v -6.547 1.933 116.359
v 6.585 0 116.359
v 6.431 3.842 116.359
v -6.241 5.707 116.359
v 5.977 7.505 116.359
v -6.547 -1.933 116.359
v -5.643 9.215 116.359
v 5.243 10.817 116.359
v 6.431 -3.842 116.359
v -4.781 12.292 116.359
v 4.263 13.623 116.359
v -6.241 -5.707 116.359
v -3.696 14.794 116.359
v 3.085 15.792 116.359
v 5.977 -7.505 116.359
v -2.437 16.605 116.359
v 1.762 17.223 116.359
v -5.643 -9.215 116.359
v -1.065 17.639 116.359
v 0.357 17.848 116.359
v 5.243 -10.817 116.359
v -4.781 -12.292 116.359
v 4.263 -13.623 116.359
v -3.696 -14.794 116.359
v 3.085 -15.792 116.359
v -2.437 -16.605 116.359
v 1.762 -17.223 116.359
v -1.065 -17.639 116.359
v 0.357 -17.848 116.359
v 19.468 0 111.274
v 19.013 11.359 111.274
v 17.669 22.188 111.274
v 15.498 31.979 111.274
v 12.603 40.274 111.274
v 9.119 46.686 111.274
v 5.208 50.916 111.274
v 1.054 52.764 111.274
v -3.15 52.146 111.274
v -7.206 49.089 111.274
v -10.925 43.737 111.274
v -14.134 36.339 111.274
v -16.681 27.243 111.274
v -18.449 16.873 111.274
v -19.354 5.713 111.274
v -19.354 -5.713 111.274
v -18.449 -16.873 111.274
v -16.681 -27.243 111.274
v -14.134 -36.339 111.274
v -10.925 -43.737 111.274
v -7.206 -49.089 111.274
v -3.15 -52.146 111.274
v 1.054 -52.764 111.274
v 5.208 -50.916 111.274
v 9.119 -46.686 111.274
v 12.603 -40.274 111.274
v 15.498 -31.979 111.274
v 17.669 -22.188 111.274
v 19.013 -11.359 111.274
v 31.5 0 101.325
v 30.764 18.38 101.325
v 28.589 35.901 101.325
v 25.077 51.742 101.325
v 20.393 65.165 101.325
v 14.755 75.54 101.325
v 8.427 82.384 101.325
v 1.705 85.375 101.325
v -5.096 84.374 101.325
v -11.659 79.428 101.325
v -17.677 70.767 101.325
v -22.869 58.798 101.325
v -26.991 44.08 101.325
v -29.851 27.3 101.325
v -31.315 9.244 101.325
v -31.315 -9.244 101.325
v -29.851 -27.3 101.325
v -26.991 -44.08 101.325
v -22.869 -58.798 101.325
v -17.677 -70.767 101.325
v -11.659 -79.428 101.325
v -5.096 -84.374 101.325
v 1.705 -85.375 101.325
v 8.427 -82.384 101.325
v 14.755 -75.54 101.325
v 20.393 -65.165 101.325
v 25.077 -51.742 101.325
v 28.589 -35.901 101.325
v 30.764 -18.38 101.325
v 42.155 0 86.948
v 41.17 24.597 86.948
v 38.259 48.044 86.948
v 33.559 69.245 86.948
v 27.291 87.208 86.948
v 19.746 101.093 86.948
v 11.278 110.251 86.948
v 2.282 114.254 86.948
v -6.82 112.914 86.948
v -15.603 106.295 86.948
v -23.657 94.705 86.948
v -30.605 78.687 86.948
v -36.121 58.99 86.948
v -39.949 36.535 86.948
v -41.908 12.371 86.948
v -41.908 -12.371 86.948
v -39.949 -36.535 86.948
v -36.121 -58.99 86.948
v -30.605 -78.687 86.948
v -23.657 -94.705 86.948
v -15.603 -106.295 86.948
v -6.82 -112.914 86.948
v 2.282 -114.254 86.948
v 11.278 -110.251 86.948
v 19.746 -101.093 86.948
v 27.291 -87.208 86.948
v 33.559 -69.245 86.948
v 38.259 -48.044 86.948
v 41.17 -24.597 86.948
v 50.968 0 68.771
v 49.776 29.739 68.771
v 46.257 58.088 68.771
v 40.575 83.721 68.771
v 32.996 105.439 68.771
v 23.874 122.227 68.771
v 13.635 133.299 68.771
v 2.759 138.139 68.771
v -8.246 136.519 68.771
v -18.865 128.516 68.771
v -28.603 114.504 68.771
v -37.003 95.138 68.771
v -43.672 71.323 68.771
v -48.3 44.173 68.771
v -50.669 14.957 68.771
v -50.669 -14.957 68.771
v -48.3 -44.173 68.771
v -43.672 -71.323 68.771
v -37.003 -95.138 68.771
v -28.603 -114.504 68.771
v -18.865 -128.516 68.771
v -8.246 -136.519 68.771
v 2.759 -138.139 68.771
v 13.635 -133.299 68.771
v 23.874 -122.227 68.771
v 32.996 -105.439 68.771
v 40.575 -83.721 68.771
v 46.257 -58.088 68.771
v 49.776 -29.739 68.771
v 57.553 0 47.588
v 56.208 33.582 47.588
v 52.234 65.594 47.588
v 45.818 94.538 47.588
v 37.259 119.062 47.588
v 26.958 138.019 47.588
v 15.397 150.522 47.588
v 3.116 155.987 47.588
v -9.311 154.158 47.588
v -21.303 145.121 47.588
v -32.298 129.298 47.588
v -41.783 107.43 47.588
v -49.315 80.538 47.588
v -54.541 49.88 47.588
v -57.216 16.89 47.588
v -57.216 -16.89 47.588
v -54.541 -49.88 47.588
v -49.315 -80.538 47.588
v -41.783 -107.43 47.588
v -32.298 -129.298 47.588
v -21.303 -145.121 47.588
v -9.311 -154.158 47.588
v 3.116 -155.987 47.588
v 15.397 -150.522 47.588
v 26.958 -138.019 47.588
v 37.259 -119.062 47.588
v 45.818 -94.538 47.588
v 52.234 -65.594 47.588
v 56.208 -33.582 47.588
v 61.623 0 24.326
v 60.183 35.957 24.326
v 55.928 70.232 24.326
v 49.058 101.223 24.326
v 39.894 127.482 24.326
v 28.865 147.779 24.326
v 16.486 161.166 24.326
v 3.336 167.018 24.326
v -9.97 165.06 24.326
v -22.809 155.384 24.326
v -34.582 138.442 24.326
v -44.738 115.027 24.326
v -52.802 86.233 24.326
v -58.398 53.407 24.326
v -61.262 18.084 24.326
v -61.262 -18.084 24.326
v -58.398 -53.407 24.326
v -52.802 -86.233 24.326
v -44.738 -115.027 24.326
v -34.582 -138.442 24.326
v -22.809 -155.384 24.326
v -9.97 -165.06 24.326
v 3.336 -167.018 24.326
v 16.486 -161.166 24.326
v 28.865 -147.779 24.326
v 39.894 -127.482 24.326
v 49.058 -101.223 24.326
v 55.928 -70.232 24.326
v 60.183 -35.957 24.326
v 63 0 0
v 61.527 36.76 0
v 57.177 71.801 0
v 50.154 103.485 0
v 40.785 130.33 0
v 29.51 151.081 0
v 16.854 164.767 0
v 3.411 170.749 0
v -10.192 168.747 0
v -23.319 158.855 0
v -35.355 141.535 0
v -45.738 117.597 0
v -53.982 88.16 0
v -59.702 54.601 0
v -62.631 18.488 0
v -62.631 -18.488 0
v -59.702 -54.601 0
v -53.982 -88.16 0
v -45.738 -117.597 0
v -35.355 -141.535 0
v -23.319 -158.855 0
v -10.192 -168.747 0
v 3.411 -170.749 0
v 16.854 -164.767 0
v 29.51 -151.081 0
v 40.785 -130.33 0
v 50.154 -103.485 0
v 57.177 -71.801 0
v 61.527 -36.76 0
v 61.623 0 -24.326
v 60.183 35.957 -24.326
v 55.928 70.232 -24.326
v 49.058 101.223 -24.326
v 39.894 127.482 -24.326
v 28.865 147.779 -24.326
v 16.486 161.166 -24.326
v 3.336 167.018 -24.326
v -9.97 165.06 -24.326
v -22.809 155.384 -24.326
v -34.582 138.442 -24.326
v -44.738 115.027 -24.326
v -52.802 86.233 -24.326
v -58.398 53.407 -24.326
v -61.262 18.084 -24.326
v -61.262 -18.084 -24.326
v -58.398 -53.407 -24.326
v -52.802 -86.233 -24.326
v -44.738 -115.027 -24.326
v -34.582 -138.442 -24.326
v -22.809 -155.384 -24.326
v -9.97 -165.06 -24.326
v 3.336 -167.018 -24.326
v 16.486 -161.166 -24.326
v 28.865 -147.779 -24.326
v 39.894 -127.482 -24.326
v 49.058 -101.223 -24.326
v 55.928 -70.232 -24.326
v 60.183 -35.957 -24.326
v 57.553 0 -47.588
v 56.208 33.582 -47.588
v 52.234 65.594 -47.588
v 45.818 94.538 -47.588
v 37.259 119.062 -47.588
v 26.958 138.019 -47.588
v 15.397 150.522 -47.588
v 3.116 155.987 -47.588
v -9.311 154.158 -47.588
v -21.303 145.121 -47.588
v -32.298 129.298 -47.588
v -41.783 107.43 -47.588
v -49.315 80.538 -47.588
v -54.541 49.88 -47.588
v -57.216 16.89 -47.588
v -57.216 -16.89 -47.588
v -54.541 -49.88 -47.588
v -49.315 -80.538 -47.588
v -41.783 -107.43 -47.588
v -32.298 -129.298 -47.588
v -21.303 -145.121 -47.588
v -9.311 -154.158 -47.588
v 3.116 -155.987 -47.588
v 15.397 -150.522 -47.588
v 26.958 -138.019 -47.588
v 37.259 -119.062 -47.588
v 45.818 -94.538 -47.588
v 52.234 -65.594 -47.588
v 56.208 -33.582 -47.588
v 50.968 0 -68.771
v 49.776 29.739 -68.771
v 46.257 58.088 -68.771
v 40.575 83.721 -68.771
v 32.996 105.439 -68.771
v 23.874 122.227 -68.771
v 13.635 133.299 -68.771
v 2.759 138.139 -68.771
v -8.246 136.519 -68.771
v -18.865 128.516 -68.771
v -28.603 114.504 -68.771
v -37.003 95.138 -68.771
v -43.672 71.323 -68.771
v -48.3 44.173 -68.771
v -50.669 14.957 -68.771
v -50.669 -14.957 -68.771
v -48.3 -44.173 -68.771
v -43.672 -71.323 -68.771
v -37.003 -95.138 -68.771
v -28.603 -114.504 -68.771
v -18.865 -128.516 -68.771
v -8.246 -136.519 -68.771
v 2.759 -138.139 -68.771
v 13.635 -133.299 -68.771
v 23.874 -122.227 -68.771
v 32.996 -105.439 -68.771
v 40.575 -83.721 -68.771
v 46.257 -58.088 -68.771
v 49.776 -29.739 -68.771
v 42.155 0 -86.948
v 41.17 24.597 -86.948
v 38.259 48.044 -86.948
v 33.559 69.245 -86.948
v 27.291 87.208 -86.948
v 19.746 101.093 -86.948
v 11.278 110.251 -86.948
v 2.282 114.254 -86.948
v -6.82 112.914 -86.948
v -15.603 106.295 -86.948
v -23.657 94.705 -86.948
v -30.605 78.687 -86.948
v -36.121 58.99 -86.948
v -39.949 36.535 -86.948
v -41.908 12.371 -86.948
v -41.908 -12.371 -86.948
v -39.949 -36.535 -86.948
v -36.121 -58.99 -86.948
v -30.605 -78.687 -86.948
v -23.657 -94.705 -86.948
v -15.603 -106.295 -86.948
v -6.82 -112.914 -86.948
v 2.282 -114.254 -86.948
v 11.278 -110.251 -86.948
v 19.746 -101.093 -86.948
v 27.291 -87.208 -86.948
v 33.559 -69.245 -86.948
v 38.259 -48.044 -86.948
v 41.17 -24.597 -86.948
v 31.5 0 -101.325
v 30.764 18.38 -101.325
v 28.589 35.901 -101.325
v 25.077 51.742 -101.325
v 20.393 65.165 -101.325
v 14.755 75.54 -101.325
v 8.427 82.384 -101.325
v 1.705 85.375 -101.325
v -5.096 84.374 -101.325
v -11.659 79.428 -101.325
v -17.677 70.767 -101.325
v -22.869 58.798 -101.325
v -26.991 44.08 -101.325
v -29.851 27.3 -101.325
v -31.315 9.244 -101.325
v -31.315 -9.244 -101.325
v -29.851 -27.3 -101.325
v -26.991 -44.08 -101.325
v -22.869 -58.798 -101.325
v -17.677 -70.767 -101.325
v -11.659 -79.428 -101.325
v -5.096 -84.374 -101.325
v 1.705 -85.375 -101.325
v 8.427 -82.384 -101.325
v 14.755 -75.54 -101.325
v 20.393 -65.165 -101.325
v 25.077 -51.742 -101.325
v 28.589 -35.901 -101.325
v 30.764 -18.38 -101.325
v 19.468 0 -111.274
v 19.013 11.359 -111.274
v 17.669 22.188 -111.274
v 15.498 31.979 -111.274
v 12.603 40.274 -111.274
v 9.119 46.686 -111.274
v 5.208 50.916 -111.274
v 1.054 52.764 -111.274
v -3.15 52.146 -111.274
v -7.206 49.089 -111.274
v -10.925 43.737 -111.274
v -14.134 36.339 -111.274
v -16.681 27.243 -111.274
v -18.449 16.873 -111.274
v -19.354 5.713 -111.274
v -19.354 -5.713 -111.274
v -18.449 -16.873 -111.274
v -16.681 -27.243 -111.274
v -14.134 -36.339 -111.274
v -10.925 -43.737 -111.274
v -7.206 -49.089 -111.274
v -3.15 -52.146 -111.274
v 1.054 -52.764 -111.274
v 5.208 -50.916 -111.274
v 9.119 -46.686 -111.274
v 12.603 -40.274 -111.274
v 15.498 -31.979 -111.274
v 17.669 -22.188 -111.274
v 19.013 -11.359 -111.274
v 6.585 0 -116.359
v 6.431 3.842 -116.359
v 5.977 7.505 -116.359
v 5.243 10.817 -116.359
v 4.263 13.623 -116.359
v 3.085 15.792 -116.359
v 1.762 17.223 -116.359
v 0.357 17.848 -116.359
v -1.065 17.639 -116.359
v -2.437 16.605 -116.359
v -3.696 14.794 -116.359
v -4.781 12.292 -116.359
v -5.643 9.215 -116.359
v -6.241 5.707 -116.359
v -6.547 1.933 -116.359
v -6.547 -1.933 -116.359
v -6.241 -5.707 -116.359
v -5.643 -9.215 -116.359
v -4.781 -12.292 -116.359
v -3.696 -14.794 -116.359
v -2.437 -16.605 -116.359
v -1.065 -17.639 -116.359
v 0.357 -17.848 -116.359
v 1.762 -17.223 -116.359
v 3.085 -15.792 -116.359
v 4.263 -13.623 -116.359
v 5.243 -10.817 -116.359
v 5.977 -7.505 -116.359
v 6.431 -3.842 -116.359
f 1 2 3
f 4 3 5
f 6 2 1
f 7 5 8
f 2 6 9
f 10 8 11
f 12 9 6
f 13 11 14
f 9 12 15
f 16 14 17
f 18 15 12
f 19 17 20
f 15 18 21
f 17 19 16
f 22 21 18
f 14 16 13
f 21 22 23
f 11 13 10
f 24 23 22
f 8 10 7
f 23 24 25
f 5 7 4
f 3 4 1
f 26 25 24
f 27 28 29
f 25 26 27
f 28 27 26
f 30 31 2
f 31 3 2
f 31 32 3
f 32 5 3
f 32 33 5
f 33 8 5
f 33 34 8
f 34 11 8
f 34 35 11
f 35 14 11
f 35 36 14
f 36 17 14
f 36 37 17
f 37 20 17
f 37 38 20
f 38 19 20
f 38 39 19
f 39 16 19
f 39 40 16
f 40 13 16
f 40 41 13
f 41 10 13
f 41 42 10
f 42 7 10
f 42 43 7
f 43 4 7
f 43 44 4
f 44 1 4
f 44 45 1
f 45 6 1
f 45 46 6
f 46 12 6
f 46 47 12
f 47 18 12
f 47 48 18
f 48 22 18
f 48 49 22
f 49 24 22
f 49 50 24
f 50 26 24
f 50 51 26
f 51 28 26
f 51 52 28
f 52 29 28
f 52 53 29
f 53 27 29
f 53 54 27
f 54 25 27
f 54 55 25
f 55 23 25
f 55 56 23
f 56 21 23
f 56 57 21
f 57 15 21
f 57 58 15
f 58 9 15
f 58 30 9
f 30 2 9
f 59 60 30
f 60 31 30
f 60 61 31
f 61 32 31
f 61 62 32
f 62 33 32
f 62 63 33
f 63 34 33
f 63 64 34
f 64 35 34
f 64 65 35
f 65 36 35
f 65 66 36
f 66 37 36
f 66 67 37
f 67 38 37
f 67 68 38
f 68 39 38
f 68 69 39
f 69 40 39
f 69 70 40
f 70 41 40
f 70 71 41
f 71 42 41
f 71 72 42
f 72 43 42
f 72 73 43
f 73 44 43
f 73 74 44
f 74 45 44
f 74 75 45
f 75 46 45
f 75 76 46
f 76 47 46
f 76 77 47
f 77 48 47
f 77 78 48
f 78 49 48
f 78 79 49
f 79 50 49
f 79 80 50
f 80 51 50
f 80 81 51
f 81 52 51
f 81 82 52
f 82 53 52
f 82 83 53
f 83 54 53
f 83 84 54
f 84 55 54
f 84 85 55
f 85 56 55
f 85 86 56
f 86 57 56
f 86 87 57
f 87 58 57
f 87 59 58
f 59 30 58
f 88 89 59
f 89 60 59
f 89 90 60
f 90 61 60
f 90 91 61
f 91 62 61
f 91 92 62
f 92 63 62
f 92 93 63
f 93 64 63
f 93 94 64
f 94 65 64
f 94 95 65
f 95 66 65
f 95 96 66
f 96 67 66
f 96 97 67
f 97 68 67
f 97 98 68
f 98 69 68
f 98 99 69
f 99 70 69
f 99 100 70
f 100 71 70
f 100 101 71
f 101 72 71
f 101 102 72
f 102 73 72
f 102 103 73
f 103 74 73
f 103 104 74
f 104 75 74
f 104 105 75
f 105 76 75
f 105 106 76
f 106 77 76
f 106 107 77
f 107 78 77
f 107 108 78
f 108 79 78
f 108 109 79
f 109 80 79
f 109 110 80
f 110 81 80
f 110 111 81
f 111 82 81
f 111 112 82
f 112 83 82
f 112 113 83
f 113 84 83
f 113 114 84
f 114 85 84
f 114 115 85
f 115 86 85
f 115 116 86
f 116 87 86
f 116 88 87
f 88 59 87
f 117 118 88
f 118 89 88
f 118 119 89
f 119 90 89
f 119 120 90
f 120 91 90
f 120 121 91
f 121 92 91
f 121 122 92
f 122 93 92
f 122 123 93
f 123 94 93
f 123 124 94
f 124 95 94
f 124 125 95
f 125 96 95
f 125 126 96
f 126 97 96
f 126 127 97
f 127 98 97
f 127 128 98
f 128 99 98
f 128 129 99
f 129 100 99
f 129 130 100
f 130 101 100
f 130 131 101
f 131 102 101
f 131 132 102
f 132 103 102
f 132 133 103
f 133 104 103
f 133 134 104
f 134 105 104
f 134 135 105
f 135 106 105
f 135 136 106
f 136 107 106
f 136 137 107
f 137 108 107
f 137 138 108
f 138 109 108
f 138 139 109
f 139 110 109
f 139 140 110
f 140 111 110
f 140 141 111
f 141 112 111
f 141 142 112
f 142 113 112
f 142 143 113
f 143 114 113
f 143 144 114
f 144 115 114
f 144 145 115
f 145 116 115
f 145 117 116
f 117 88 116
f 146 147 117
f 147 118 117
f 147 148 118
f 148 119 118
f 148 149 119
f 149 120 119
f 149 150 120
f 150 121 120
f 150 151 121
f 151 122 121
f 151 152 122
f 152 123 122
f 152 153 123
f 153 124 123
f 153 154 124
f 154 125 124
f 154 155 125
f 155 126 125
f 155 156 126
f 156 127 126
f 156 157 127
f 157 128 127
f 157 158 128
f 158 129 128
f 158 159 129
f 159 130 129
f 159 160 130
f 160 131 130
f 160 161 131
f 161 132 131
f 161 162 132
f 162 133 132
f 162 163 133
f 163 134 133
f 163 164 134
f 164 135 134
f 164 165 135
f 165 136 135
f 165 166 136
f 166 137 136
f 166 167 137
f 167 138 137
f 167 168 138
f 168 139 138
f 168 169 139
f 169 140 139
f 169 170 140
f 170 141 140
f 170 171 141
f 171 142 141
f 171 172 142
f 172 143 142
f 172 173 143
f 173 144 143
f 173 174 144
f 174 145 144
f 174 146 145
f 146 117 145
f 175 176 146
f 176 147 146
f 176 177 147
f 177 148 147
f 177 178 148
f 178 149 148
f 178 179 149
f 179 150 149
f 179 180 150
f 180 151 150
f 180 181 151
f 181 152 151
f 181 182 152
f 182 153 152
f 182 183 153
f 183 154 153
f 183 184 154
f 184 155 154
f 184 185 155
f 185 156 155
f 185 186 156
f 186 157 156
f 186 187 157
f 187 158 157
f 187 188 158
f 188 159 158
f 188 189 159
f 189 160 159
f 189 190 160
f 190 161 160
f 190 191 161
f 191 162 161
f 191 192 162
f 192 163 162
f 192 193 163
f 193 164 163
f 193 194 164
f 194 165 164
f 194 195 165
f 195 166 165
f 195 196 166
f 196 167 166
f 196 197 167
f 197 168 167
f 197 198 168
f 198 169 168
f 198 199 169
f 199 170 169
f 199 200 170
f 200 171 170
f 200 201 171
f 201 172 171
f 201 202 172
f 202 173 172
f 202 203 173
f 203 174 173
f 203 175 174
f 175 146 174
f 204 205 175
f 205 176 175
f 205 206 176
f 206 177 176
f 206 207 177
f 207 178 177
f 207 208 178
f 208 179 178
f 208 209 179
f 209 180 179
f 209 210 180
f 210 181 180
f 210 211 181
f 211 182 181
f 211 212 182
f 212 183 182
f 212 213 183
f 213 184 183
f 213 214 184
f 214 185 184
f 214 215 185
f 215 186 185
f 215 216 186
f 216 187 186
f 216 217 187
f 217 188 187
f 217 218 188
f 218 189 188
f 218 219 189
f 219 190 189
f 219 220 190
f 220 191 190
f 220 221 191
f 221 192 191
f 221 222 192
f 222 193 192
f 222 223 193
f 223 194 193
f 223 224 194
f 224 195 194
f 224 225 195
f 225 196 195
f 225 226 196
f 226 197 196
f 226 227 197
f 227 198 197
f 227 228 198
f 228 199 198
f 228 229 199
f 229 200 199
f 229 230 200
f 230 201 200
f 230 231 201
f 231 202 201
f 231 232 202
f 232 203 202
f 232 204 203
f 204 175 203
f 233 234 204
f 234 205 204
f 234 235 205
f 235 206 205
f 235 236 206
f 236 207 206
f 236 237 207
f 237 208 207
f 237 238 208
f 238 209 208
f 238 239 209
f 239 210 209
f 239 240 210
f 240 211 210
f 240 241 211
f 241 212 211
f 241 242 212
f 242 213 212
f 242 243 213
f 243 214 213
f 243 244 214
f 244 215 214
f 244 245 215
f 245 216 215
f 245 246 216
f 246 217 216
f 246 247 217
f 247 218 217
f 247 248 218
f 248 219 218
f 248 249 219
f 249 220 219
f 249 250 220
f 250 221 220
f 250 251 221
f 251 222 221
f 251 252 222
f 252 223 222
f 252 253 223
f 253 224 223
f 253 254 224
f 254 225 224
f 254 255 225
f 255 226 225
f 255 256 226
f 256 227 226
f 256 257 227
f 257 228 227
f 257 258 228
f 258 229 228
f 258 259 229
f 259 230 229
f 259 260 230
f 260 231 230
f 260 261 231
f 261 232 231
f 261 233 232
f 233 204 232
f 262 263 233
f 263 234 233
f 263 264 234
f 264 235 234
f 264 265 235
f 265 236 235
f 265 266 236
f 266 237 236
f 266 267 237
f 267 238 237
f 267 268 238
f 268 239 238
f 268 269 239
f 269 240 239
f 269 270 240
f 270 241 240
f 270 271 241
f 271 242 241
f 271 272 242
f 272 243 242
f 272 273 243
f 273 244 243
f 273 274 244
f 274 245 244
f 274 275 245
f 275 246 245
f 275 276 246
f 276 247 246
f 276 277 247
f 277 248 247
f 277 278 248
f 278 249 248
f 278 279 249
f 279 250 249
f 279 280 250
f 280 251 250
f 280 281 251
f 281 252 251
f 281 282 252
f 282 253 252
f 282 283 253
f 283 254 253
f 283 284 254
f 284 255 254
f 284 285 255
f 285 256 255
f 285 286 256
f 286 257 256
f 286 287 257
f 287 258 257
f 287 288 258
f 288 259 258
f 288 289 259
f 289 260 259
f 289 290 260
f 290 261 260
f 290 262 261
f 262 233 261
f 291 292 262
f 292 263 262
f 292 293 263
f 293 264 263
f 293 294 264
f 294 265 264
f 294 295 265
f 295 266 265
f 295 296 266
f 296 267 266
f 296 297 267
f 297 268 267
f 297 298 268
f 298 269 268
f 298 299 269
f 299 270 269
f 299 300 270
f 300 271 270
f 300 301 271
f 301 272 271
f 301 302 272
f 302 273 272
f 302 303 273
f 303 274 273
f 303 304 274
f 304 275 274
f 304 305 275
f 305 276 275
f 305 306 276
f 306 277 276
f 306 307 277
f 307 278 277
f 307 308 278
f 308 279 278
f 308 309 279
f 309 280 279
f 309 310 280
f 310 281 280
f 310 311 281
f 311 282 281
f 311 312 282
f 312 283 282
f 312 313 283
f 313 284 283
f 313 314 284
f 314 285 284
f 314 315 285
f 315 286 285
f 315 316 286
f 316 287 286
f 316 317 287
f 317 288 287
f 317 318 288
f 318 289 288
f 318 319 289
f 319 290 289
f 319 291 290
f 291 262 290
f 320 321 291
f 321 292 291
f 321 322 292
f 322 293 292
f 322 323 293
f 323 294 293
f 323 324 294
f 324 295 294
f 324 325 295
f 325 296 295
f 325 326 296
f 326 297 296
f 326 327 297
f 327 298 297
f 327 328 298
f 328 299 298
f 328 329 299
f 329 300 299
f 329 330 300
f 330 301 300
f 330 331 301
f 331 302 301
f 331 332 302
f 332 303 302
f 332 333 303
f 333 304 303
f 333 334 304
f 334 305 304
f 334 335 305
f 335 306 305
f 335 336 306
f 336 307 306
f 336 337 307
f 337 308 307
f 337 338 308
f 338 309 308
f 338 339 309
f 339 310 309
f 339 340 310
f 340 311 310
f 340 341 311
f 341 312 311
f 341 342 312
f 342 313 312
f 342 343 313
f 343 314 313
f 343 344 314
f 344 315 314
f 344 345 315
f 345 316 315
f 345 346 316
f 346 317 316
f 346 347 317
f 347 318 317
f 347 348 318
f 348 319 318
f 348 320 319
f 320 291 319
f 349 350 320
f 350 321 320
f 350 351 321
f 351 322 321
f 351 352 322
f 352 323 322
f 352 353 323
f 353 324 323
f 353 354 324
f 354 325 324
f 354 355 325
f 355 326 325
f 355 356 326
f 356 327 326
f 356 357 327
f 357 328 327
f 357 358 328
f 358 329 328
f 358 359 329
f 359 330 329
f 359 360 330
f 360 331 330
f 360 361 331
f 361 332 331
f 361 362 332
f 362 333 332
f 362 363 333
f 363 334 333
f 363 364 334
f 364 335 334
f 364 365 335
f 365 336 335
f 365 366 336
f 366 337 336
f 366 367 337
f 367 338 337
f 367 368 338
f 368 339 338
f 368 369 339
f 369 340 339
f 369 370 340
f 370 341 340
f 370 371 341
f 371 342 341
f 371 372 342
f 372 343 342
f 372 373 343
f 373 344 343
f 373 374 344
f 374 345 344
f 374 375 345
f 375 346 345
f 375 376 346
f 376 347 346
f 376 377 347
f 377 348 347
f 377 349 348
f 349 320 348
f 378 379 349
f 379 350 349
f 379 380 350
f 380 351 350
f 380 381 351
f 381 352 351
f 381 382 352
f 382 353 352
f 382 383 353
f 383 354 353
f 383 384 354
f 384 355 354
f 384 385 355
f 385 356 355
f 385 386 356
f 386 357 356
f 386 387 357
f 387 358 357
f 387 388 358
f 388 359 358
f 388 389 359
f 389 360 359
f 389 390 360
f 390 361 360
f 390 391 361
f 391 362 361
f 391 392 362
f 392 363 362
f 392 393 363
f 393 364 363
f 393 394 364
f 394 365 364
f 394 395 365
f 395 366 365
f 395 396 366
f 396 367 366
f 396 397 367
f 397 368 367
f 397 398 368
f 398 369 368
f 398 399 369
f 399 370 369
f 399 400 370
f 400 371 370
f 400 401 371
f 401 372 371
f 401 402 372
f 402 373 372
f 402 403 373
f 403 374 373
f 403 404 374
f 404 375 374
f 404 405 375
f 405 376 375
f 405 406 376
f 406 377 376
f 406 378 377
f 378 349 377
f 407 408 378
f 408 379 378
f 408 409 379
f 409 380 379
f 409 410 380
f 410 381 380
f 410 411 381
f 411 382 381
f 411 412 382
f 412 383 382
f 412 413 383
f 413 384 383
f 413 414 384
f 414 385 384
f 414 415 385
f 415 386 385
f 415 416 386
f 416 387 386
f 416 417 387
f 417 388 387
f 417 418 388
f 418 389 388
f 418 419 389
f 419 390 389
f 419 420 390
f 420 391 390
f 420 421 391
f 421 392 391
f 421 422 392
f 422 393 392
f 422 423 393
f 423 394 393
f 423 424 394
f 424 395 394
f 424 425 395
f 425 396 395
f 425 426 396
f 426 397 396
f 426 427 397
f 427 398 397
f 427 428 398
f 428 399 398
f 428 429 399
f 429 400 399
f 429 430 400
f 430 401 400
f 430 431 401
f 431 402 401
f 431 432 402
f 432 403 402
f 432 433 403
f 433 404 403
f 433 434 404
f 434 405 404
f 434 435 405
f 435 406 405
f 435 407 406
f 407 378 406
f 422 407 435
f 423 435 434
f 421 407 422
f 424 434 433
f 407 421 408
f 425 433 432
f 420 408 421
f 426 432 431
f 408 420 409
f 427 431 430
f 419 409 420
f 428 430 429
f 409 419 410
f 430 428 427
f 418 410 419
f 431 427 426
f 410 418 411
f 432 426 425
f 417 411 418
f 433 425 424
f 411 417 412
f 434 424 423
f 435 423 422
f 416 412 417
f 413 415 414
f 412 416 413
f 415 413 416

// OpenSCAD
// Generated by SolidPython 1.0.1 on 2020-07-29 00:46:48


scale(v = [7, 19, 13]) {
	sphere(r = 9);
}
/***********************************************
*********      SolidPython code:      **********
************************************************
 
# import packages: SolidPython
from solid import *
from solid.utils import *
from itertools import chain, combinations, permutations


class Resize:

    def __init__(self, scad_file):
        self.scad_file = scad_file
        #self.scad_file = import_scad(scad_file)
        # cone/cylinder param:
        self.r1 = 0
        self.r2 = 0
        self.h = 0
        # rectangular prism param:
        self.w = 0
        self.l = 0
        # ellipse param:
        self.r = 0

    # import OpenScad code (file name corresponds to shape)


    # classify shape + parameters
    def assign(self, param1, param2, param3):
        if self.scad_file == 'cone.scad':
            self.r1 = param1
            self.r2 = param2
            self.h = param3
        elif self.scad_file == 'cylinder.scad':
            self.r1 = param1
            self.r2 = param2
            self.h = param3
        elif self.scad_file == 'rectangularPrism.scad':
            self.h = param1
            self.l = param2
            self.w = param3
        else:
            self.r = param1
            self.h = param2

    # resize parameters
    def iterate(self):
        x = range(3, 20, 2)
        i = 1
        if self.scad_file == 'cone.scad':
            tempList = list(permutations(x, 2))
            for temp in tempList:
                param1 = temp[0]
                param2 = temp[1]
                filepath = 'produced_scad_files/' + 'cone' + str(param1) + '_' + str(param2) + '_' + '.scad'
                scad_render_to_file(cylinder(h=param1, r1=param2, r2=0), filepath)

        elif self.scad_file == 'cylinder.scad':
            tempList = list(permutations(x, 3))
            for temp in tempList:
                param1 = temp[0]
                param2 = temp[1]
                filepath = 'produced_scad_files/' + 'cylinder' + str(param1) + '_' + str(param2) + '_' + '.scad'
                scad_render_to_file(cylinder(h=param1, r1=param2, r2=param2), filepath)

        elif self.scad_file == 'rectangularPrism.scad':
            tempList = list(permutations(x, 3))
            for temp in tempList:
                param1 = temp[0]
                param2 = temp[1]
                param3 = temp[2]
                filepath = 'produced_scad_files/' + 'rectangularPrism' + str(param1) + '_' + str(param2) + '_' + str(
                    param3) + '.scad'
                scad_render_to_file(cube(size=(param1, param2, param3)), filepath)

        elif self.scad_file == 'ellipse.scad':
            tempList = list(permutations(x, 4))
            for temp in tempList:
                param1 = temp[0]
                param2 = temp[1]
                param3 = temp[2]
                param4 = temp[3]
                filepath = 'produced_scad_files/' + 'ellipse' + str(param1) + '_' + str(param2) + '_' + str(param3) + '_' + str(param4) + '.scad'
                scad_render_to_file(scale([param1, param2, param3])(sphere(r=param4)), filepath)

    def render_to_scadfile(self):
        scad_render_to_file(scad, 'example.scad') 
 
************************************************/
